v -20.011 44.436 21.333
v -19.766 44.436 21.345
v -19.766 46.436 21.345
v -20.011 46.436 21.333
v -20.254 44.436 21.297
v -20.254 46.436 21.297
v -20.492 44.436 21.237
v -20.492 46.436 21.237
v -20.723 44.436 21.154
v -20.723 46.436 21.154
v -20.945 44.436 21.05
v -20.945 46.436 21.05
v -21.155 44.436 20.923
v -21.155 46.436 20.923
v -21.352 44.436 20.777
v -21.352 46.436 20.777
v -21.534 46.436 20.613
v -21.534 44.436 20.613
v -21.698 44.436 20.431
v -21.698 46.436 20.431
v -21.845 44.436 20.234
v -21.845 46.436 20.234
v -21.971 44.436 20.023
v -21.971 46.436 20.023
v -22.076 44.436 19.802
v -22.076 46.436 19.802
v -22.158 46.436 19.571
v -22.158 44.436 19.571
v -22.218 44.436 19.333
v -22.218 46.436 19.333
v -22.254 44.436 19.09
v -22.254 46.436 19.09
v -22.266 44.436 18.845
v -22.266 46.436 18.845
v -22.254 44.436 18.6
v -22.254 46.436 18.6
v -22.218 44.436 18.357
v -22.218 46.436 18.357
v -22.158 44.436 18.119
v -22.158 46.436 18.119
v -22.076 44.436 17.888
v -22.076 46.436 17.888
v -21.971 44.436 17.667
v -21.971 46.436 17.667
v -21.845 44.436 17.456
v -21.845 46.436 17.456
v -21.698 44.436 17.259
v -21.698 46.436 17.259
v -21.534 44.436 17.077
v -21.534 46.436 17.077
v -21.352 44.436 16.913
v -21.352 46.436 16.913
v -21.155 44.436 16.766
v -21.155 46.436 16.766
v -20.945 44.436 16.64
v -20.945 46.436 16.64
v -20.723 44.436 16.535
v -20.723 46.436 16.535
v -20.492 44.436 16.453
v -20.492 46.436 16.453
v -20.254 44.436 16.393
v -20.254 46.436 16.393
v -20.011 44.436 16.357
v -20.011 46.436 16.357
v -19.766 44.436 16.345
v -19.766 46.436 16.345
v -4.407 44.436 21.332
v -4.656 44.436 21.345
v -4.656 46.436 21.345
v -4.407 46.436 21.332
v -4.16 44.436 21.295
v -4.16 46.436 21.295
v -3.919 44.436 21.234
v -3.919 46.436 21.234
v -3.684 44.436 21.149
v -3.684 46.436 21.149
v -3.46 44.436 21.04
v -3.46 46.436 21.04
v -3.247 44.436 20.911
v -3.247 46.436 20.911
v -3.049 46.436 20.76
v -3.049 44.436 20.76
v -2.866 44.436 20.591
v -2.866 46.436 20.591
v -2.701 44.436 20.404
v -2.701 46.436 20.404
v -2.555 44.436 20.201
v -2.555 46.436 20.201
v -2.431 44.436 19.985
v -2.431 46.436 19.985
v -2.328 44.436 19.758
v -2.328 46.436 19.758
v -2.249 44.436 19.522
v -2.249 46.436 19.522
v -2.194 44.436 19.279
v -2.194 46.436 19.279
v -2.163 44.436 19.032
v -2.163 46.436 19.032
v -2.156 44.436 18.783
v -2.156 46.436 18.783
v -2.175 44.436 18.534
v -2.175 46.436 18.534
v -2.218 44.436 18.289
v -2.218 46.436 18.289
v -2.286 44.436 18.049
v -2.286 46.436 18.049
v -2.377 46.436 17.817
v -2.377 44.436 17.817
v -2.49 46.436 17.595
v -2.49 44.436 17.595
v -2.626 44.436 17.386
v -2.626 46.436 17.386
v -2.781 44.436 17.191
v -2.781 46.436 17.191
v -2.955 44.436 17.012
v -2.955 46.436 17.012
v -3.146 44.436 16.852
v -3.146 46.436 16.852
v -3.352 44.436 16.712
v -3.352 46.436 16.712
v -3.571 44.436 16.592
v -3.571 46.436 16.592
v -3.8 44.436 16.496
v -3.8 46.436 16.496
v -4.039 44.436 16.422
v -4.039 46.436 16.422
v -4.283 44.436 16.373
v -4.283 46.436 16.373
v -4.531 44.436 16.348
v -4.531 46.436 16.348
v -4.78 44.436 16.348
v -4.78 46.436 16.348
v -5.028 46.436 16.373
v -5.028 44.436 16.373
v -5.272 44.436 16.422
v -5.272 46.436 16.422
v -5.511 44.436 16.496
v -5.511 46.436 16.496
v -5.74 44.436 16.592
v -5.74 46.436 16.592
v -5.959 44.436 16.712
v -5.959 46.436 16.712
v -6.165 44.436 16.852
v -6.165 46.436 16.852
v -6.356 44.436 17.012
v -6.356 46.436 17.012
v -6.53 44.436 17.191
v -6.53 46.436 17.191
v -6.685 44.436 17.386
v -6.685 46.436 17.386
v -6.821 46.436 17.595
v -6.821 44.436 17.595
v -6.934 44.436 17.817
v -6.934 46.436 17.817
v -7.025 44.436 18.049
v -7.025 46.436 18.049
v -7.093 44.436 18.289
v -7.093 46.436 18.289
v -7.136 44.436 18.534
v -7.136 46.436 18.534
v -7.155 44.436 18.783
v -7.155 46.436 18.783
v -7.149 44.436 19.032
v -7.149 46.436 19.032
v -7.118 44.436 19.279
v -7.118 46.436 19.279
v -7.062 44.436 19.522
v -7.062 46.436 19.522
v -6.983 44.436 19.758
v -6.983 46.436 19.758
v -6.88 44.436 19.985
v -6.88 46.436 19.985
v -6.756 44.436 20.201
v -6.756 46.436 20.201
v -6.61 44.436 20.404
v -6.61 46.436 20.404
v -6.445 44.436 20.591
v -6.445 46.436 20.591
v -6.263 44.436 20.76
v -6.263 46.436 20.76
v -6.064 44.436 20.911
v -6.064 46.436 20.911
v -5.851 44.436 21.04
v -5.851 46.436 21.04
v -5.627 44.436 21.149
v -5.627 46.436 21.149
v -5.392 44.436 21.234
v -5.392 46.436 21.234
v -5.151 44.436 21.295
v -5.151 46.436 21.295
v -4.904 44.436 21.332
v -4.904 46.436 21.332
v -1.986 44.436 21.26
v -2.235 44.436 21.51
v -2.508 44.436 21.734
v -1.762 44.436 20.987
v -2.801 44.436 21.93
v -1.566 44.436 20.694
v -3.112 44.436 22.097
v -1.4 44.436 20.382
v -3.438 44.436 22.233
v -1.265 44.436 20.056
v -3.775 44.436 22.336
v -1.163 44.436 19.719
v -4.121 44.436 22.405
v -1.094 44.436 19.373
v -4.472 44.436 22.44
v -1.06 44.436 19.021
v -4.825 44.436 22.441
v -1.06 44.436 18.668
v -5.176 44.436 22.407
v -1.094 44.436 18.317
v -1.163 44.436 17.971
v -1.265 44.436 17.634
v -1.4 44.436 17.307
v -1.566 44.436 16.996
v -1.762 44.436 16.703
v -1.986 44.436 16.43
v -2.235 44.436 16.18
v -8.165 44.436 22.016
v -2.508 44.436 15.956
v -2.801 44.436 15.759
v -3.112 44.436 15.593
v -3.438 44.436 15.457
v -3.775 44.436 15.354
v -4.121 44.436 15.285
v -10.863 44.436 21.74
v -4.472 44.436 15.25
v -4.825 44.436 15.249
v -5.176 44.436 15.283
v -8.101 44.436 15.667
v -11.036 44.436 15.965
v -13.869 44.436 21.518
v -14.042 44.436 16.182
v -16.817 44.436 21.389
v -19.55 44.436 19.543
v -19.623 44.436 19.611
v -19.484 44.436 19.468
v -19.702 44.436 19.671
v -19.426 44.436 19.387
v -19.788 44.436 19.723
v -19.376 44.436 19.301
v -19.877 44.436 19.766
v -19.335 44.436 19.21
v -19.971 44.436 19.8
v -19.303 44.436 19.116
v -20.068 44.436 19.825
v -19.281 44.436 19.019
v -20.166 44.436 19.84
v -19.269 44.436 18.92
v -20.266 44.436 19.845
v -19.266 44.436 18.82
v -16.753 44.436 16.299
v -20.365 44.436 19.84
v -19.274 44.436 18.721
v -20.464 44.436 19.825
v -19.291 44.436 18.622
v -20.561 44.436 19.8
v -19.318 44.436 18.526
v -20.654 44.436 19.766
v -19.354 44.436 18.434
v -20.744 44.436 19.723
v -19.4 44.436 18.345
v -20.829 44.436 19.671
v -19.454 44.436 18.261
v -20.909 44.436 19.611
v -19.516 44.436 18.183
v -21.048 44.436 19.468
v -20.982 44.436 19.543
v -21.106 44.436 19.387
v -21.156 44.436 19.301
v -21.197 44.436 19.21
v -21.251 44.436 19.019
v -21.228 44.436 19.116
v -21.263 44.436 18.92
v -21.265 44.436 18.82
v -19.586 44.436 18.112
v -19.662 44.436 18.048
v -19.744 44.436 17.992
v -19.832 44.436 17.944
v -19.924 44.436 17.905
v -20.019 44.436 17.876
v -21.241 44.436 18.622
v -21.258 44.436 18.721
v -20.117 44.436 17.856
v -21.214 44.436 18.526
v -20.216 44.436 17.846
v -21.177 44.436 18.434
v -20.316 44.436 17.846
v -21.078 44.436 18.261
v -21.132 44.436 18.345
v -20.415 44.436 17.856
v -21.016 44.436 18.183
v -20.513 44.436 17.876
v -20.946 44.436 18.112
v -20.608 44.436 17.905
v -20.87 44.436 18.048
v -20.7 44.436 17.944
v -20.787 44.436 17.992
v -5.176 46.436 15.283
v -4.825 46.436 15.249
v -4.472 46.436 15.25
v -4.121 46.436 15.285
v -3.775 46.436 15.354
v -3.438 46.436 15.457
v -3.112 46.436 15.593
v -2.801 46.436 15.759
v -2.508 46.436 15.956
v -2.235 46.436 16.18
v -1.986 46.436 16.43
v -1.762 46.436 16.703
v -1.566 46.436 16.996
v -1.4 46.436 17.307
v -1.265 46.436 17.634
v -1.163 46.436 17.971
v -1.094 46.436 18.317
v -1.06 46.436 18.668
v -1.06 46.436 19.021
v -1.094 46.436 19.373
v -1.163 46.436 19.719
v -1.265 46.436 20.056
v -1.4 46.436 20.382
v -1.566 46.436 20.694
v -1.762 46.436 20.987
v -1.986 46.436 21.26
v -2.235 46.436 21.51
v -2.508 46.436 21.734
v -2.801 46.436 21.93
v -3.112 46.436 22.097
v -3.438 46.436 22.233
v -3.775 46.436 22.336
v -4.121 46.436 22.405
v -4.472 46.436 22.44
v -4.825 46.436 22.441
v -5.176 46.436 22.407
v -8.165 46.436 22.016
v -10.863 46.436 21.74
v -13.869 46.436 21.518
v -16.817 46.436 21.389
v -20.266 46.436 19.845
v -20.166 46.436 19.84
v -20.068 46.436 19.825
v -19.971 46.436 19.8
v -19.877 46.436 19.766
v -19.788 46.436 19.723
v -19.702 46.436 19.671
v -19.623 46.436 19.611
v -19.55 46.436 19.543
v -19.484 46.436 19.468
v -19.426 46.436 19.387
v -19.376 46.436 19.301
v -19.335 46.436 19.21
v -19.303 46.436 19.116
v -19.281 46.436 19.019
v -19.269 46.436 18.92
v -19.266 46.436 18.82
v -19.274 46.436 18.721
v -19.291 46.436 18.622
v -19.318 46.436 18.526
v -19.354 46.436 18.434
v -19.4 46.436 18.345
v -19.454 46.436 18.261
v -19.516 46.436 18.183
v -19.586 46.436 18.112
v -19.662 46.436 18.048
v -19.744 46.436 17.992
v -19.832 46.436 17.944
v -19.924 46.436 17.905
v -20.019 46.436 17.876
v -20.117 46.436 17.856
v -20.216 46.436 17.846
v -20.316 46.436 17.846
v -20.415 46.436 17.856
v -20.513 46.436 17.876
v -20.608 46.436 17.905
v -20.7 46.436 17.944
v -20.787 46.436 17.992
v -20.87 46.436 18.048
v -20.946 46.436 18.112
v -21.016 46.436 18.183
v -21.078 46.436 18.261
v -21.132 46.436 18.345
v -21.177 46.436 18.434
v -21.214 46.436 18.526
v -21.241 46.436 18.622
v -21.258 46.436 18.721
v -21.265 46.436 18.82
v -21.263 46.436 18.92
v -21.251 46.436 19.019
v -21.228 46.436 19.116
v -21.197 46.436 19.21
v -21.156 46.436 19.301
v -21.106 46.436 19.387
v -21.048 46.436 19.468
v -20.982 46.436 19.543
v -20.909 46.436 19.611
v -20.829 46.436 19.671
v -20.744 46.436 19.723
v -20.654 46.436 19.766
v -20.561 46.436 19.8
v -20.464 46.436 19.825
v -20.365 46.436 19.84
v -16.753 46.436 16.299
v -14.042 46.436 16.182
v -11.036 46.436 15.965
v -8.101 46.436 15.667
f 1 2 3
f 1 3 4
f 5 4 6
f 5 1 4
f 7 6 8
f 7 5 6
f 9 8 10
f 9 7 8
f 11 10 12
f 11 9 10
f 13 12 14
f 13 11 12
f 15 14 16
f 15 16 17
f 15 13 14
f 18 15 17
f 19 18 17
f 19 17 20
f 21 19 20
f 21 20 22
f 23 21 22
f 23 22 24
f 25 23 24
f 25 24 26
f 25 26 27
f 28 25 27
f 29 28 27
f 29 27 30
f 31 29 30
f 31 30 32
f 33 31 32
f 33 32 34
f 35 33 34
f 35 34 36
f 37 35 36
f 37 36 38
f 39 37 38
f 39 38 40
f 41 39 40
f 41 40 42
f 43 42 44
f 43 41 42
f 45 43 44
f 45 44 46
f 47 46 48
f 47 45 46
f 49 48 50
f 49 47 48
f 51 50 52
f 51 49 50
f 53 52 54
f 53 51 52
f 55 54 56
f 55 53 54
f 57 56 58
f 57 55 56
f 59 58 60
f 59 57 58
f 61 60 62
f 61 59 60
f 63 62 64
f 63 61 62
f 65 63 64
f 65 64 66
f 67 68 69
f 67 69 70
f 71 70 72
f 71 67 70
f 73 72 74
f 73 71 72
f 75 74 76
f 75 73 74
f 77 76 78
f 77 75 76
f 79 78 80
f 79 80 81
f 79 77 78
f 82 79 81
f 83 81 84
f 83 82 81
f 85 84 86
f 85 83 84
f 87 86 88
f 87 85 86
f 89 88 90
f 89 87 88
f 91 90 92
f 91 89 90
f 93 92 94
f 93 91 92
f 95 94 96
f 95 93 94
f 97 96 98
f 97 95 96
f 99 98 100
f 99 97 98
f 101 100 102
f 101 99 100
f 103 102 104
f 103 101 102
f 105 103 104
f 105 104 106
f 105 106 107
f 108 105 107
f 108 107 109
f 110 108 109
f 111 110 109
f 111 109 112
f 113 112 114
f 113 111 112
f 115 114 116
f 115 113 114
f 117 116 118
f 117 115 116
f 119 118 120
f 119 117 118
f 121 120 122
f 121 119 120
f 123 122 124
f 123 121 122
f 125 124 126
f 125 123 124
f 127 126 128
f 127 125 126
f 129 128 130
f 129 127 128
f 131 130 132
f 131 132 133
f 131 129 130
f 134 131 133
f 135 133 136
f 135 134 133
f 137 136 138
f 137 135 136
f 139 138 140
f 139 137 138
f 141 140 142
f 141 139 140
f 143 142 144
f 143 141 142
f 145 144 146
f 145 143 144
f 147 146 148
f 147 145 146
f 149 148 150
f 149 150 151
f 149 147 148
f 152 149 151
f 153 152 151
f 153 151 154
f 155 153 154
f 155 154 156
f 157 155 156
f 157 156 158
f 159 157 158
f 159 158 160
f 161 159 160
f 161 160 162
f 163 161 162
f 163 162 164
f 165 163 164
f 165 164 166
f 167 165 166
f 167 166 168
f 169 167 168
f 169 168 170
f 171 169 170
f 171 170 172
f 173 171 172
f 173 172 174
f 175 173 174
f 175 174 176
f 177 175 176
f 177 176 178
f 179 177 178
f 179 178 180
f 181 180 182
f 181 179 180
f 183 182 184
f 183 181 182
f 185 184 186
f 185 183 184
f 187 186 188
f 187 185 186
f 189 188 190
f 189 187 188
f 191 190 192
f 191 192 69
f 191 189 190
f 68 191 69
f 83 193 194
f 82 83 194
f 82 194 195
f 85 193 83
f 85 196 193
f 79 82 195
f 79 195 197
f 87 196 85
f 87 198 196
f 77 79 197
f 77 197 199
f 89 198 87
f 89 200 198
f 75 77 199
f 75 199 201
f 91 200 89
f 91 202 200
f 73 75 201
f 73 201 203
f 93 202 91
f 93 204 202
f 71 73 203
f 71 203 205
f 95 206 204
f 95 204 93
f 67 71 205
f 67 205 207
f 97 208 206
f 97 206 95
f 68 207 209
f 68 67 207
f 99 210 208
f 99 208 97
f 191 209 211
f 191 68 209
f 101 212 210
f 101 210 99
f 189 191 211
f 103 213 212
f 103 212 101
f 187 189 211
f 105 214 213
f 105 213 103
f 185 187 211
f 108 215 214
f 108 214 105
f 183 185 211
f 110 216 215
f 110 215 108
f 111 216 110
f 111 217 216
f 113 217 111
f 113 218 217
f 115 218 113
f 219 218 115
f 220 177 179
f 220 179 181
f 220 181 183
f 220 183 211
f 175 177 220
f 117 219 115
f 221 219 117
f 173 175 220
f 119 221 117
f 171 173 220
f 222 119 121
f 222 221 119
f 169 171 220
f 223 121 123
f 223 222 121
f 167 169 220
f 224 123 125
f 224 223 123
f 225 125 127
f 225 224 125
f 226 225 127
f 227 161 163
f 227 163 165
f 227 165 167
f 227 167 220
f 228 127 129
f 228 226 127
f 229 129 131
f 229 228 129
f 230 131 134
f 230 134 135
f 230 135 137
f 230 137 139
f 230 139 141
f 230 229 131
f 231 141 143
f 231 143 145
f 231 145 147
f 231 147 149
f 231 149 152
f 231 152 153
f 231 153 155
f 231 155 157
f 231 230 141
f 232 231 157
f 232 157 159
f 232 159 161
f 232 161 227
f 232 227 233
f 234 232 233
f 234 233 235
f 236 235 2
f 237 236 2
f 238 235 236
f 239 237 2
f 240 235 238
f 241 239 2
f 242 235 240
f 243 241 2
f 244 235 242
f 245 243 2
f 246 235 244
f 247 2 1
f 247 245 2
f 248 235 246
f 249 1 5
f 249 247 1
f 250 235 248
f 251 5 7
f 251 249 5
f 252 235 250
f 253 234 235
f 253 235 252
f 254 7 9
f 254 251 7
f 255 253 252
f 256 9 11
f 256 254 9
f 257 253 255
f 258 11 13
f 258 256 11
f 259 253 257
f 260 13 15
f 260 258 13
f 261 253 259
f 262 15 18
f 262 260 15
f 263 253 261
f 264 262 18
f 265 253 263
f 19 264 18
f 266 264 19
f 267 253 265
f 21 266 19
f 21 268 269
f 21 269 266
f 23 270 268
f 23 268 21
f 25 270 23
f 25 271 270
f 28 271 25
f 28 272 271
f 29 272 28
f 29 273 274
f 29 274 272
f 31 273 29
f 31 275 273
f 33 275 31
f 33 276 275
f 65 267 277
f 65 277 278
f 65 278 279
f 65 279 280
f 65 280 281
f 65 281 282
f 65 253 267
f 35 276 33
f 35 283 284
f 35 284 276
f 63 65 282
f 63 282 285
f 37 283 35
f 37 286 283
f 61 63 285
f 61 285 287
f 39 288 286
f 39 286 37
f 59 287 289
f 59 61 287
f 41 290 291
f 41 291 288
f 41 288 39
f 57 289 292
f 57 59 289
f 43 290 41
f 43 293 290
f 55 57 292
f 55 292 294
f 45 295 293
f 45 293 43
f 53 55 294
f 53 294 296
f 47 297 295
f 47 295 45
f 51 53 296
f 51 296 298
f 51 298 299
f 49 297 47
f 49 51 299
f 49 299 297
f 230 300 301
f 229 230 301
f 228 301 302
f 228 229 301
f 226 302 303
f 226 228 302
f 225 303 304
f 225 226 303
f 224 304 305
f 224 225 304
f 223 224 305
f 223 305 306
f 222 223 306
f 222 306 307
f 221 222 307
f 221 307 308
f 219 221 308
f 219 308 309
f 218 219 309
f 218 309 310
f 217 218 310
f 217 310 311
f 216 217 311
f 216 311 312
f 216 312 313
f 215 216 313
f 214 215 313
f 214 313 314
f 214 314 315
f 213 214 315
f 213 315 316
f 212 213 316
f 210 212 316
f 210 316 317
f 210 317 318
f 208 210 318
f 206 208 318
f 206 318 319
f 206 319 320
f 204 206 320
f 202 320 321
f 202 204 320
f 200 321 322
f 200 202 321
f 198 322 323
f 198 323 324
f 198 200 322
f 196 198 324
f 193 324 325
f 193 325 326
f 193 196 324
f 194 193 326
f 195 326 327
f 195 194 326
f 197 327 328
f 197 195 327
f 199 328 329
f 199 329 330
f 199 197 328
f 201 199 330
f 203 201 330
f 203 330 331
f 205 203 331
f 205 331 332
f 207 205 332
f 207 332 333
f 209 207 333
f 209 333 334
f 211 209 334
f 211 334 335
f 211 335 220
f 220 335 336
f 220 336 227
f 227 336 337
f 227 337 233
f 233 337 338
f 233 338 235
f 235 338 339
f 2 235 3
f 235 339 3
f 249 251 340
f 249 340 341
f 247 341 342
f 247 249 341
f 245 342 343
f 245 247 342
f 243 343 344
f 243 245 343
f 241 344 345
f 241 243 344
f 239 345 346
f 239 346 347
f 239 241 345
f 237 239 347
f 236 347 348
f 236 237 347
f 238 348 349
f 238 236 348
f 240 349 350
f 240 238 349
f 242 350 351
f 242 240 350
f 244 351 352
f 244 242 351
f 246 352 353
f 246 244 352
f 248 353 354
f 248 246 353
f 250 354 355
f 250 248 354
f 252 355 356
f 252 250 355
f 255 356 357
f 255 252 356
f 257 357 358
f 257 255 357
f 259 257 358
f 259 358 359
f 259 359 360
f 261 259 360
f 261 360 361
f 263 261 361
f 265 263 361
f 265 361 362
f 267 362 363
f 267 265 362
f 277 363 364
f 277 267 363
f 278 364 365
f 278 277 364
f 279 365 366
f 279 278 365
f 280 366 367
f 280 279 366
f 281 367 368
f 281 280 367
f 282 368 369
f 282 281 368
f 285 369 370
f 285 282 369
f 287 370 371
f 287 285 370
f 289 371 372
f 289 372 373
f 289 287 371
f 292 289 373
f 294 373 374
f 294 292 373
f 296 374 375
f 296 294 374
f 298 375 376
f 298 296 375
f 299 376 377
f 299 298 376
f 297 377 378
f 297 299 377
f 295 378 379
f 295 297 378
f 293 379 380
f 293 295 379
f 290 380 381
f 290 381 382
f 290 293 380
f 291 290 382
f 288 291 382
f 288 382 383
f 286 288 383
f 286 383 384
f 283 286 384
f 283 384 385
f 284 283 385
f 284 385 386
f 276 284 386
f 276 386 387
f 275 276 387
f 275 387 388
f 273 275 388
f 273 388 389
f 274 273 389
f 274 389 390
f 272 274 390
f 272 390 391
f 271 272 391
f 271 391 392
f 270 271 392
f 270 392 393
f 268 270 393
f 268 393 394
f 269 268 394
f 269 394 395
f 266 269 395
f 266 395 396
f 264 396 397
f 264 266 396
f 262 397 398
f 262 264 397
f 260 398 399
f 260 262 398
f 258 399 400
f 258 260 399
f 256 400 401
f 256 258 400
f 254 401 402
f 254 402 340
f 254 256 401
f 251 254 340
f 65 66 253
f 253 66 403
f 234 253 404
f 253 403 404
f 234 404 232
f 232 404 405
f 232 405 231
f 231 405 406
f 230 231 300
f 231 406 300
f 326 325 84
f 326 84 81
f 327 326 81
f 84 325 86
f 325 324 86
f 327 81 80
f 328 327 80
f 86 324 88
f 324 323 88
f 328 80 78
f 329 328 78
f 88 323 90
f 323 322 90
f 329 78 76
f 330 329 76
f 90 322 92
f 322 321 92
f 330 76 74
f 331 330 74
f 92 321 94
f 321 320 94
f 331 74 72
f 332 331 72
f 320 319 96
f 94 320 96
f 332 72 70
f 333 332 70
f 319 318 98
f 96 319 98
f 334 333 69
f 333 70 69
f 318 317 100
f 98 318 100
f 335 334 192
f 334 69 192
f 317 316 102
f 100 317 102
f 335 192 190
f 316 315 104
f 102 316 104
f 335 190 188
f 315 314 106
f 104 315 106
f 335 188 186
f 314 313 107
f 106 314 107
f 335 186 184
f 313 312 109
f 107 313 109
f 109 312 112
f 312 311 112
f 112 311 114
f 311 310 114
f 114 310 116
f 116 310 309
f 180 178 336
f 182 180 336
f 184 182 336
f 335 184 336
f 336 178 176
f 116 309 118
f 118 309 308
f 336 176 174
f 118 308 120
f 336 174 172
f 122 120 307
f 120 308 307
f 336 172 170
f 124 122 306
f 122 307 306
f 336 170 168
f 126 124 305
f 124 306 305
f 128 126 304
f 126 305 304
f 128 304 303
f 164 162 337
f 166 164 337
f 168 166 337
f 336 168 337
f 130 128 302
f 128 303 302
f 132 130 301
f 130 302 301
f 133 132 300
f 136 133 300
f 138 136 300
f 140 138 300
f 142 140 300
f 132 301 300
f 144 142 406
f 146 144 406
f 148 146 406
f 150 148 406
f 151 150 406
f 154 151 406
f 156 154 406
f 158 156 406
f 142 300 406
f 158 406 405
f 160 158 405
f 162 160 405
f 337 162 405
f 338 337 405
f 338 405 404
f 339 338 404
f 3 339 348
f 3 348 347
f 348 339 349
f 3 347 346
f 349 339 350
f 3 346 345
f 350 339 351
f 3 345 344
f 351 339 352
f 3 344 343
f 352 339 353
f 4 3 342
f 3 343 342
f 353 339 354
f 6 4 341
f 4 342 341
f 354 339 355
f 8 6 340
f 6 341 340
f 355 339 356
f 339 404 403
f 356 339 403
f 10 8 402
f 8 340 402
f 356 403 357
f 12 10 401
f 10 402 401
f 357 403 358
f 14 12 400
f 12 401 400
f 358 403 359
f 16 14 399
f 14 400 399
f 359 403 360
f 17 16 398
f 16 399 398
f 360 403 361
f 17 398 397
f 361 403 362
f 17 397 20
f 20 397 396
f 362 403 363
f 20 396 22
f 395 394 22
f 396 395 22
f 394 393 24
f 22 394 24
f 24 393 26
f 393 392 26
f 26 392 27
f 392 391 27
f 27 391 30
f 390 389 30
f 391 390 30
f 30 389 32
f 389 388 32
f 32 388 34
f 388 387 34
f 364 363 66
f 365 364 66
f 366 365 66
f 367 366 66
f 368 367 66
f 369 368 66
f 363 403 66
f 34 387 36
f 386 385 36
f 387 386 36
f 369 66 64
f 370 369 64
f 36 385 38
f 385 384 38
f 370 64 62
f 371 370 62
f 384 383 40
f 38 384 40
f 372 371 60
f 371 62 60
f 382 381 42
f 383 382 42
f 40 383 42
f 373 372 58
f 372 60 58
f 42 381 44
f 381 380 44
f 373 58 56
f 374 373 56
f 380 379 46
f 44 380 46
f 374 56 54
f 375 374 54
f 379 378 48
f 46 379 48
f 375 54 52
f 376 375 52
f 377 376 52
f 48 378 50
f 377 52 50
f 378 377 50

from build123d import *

# Parameters (mm, degrees)
CROQUIS1_R              = 2.5
CROQUIS1_R_2            = 1
SALIENTE_EXTRUIR1_DEPTH = 2
REDONDEO1_R             = 101


with BuildPart() as part:
    # Croquis1 → Saliente-Extruir1 (new body)
    with BuildSketch(Plane(origin=(0, 44.435642752, 0), x_dir=(1, 0, 0), z_dir=(0, 1, 0))):
        with BuildLine():
            Line((-19.765786092, -16.344915397), (-7.245908087, -16.344915397))
            ThreePointArc((-7.245908087, -16.344915397), (-1.055541318, -18.844915397), (-7.245908087, -21.344915397))
            Line((-7.245908087, -21.344915397), (-19.765786092, -21.344915397))
            ThreePointArc((-19.765786092, -21.344915397), (-22.265786092, -18.844915397), (-19.765786092, -16.344915397))
        make_face()
        with Locations(Location((-4.655541318, -18.844915397, 0), (0, 0, 270))):
            Circle(CROQUIS1_R, mode=Mode.SUBTRACT)
        with Locations(Location((-20.265786092, -18.844915397, 0), (0, 0, 270))):
            Circle(CROQUIS1_R_2, mode=Mode.SUBTRACT)
    extrude(amount=SALIENTE_EXTRUIR1_DEPTH)

    # Redondeo1
    redondeo1_edges = [part.edges().sort_by_distance(p)[0] for p in [
        (-7.245908087, 45.435642752, 16.344915397),
        (-7.245908087, 45.435642752, 21.344915397),
    ]]
    fillet(redondeo1_edges, radius=REDONDEO1_R)


solid = part.part
